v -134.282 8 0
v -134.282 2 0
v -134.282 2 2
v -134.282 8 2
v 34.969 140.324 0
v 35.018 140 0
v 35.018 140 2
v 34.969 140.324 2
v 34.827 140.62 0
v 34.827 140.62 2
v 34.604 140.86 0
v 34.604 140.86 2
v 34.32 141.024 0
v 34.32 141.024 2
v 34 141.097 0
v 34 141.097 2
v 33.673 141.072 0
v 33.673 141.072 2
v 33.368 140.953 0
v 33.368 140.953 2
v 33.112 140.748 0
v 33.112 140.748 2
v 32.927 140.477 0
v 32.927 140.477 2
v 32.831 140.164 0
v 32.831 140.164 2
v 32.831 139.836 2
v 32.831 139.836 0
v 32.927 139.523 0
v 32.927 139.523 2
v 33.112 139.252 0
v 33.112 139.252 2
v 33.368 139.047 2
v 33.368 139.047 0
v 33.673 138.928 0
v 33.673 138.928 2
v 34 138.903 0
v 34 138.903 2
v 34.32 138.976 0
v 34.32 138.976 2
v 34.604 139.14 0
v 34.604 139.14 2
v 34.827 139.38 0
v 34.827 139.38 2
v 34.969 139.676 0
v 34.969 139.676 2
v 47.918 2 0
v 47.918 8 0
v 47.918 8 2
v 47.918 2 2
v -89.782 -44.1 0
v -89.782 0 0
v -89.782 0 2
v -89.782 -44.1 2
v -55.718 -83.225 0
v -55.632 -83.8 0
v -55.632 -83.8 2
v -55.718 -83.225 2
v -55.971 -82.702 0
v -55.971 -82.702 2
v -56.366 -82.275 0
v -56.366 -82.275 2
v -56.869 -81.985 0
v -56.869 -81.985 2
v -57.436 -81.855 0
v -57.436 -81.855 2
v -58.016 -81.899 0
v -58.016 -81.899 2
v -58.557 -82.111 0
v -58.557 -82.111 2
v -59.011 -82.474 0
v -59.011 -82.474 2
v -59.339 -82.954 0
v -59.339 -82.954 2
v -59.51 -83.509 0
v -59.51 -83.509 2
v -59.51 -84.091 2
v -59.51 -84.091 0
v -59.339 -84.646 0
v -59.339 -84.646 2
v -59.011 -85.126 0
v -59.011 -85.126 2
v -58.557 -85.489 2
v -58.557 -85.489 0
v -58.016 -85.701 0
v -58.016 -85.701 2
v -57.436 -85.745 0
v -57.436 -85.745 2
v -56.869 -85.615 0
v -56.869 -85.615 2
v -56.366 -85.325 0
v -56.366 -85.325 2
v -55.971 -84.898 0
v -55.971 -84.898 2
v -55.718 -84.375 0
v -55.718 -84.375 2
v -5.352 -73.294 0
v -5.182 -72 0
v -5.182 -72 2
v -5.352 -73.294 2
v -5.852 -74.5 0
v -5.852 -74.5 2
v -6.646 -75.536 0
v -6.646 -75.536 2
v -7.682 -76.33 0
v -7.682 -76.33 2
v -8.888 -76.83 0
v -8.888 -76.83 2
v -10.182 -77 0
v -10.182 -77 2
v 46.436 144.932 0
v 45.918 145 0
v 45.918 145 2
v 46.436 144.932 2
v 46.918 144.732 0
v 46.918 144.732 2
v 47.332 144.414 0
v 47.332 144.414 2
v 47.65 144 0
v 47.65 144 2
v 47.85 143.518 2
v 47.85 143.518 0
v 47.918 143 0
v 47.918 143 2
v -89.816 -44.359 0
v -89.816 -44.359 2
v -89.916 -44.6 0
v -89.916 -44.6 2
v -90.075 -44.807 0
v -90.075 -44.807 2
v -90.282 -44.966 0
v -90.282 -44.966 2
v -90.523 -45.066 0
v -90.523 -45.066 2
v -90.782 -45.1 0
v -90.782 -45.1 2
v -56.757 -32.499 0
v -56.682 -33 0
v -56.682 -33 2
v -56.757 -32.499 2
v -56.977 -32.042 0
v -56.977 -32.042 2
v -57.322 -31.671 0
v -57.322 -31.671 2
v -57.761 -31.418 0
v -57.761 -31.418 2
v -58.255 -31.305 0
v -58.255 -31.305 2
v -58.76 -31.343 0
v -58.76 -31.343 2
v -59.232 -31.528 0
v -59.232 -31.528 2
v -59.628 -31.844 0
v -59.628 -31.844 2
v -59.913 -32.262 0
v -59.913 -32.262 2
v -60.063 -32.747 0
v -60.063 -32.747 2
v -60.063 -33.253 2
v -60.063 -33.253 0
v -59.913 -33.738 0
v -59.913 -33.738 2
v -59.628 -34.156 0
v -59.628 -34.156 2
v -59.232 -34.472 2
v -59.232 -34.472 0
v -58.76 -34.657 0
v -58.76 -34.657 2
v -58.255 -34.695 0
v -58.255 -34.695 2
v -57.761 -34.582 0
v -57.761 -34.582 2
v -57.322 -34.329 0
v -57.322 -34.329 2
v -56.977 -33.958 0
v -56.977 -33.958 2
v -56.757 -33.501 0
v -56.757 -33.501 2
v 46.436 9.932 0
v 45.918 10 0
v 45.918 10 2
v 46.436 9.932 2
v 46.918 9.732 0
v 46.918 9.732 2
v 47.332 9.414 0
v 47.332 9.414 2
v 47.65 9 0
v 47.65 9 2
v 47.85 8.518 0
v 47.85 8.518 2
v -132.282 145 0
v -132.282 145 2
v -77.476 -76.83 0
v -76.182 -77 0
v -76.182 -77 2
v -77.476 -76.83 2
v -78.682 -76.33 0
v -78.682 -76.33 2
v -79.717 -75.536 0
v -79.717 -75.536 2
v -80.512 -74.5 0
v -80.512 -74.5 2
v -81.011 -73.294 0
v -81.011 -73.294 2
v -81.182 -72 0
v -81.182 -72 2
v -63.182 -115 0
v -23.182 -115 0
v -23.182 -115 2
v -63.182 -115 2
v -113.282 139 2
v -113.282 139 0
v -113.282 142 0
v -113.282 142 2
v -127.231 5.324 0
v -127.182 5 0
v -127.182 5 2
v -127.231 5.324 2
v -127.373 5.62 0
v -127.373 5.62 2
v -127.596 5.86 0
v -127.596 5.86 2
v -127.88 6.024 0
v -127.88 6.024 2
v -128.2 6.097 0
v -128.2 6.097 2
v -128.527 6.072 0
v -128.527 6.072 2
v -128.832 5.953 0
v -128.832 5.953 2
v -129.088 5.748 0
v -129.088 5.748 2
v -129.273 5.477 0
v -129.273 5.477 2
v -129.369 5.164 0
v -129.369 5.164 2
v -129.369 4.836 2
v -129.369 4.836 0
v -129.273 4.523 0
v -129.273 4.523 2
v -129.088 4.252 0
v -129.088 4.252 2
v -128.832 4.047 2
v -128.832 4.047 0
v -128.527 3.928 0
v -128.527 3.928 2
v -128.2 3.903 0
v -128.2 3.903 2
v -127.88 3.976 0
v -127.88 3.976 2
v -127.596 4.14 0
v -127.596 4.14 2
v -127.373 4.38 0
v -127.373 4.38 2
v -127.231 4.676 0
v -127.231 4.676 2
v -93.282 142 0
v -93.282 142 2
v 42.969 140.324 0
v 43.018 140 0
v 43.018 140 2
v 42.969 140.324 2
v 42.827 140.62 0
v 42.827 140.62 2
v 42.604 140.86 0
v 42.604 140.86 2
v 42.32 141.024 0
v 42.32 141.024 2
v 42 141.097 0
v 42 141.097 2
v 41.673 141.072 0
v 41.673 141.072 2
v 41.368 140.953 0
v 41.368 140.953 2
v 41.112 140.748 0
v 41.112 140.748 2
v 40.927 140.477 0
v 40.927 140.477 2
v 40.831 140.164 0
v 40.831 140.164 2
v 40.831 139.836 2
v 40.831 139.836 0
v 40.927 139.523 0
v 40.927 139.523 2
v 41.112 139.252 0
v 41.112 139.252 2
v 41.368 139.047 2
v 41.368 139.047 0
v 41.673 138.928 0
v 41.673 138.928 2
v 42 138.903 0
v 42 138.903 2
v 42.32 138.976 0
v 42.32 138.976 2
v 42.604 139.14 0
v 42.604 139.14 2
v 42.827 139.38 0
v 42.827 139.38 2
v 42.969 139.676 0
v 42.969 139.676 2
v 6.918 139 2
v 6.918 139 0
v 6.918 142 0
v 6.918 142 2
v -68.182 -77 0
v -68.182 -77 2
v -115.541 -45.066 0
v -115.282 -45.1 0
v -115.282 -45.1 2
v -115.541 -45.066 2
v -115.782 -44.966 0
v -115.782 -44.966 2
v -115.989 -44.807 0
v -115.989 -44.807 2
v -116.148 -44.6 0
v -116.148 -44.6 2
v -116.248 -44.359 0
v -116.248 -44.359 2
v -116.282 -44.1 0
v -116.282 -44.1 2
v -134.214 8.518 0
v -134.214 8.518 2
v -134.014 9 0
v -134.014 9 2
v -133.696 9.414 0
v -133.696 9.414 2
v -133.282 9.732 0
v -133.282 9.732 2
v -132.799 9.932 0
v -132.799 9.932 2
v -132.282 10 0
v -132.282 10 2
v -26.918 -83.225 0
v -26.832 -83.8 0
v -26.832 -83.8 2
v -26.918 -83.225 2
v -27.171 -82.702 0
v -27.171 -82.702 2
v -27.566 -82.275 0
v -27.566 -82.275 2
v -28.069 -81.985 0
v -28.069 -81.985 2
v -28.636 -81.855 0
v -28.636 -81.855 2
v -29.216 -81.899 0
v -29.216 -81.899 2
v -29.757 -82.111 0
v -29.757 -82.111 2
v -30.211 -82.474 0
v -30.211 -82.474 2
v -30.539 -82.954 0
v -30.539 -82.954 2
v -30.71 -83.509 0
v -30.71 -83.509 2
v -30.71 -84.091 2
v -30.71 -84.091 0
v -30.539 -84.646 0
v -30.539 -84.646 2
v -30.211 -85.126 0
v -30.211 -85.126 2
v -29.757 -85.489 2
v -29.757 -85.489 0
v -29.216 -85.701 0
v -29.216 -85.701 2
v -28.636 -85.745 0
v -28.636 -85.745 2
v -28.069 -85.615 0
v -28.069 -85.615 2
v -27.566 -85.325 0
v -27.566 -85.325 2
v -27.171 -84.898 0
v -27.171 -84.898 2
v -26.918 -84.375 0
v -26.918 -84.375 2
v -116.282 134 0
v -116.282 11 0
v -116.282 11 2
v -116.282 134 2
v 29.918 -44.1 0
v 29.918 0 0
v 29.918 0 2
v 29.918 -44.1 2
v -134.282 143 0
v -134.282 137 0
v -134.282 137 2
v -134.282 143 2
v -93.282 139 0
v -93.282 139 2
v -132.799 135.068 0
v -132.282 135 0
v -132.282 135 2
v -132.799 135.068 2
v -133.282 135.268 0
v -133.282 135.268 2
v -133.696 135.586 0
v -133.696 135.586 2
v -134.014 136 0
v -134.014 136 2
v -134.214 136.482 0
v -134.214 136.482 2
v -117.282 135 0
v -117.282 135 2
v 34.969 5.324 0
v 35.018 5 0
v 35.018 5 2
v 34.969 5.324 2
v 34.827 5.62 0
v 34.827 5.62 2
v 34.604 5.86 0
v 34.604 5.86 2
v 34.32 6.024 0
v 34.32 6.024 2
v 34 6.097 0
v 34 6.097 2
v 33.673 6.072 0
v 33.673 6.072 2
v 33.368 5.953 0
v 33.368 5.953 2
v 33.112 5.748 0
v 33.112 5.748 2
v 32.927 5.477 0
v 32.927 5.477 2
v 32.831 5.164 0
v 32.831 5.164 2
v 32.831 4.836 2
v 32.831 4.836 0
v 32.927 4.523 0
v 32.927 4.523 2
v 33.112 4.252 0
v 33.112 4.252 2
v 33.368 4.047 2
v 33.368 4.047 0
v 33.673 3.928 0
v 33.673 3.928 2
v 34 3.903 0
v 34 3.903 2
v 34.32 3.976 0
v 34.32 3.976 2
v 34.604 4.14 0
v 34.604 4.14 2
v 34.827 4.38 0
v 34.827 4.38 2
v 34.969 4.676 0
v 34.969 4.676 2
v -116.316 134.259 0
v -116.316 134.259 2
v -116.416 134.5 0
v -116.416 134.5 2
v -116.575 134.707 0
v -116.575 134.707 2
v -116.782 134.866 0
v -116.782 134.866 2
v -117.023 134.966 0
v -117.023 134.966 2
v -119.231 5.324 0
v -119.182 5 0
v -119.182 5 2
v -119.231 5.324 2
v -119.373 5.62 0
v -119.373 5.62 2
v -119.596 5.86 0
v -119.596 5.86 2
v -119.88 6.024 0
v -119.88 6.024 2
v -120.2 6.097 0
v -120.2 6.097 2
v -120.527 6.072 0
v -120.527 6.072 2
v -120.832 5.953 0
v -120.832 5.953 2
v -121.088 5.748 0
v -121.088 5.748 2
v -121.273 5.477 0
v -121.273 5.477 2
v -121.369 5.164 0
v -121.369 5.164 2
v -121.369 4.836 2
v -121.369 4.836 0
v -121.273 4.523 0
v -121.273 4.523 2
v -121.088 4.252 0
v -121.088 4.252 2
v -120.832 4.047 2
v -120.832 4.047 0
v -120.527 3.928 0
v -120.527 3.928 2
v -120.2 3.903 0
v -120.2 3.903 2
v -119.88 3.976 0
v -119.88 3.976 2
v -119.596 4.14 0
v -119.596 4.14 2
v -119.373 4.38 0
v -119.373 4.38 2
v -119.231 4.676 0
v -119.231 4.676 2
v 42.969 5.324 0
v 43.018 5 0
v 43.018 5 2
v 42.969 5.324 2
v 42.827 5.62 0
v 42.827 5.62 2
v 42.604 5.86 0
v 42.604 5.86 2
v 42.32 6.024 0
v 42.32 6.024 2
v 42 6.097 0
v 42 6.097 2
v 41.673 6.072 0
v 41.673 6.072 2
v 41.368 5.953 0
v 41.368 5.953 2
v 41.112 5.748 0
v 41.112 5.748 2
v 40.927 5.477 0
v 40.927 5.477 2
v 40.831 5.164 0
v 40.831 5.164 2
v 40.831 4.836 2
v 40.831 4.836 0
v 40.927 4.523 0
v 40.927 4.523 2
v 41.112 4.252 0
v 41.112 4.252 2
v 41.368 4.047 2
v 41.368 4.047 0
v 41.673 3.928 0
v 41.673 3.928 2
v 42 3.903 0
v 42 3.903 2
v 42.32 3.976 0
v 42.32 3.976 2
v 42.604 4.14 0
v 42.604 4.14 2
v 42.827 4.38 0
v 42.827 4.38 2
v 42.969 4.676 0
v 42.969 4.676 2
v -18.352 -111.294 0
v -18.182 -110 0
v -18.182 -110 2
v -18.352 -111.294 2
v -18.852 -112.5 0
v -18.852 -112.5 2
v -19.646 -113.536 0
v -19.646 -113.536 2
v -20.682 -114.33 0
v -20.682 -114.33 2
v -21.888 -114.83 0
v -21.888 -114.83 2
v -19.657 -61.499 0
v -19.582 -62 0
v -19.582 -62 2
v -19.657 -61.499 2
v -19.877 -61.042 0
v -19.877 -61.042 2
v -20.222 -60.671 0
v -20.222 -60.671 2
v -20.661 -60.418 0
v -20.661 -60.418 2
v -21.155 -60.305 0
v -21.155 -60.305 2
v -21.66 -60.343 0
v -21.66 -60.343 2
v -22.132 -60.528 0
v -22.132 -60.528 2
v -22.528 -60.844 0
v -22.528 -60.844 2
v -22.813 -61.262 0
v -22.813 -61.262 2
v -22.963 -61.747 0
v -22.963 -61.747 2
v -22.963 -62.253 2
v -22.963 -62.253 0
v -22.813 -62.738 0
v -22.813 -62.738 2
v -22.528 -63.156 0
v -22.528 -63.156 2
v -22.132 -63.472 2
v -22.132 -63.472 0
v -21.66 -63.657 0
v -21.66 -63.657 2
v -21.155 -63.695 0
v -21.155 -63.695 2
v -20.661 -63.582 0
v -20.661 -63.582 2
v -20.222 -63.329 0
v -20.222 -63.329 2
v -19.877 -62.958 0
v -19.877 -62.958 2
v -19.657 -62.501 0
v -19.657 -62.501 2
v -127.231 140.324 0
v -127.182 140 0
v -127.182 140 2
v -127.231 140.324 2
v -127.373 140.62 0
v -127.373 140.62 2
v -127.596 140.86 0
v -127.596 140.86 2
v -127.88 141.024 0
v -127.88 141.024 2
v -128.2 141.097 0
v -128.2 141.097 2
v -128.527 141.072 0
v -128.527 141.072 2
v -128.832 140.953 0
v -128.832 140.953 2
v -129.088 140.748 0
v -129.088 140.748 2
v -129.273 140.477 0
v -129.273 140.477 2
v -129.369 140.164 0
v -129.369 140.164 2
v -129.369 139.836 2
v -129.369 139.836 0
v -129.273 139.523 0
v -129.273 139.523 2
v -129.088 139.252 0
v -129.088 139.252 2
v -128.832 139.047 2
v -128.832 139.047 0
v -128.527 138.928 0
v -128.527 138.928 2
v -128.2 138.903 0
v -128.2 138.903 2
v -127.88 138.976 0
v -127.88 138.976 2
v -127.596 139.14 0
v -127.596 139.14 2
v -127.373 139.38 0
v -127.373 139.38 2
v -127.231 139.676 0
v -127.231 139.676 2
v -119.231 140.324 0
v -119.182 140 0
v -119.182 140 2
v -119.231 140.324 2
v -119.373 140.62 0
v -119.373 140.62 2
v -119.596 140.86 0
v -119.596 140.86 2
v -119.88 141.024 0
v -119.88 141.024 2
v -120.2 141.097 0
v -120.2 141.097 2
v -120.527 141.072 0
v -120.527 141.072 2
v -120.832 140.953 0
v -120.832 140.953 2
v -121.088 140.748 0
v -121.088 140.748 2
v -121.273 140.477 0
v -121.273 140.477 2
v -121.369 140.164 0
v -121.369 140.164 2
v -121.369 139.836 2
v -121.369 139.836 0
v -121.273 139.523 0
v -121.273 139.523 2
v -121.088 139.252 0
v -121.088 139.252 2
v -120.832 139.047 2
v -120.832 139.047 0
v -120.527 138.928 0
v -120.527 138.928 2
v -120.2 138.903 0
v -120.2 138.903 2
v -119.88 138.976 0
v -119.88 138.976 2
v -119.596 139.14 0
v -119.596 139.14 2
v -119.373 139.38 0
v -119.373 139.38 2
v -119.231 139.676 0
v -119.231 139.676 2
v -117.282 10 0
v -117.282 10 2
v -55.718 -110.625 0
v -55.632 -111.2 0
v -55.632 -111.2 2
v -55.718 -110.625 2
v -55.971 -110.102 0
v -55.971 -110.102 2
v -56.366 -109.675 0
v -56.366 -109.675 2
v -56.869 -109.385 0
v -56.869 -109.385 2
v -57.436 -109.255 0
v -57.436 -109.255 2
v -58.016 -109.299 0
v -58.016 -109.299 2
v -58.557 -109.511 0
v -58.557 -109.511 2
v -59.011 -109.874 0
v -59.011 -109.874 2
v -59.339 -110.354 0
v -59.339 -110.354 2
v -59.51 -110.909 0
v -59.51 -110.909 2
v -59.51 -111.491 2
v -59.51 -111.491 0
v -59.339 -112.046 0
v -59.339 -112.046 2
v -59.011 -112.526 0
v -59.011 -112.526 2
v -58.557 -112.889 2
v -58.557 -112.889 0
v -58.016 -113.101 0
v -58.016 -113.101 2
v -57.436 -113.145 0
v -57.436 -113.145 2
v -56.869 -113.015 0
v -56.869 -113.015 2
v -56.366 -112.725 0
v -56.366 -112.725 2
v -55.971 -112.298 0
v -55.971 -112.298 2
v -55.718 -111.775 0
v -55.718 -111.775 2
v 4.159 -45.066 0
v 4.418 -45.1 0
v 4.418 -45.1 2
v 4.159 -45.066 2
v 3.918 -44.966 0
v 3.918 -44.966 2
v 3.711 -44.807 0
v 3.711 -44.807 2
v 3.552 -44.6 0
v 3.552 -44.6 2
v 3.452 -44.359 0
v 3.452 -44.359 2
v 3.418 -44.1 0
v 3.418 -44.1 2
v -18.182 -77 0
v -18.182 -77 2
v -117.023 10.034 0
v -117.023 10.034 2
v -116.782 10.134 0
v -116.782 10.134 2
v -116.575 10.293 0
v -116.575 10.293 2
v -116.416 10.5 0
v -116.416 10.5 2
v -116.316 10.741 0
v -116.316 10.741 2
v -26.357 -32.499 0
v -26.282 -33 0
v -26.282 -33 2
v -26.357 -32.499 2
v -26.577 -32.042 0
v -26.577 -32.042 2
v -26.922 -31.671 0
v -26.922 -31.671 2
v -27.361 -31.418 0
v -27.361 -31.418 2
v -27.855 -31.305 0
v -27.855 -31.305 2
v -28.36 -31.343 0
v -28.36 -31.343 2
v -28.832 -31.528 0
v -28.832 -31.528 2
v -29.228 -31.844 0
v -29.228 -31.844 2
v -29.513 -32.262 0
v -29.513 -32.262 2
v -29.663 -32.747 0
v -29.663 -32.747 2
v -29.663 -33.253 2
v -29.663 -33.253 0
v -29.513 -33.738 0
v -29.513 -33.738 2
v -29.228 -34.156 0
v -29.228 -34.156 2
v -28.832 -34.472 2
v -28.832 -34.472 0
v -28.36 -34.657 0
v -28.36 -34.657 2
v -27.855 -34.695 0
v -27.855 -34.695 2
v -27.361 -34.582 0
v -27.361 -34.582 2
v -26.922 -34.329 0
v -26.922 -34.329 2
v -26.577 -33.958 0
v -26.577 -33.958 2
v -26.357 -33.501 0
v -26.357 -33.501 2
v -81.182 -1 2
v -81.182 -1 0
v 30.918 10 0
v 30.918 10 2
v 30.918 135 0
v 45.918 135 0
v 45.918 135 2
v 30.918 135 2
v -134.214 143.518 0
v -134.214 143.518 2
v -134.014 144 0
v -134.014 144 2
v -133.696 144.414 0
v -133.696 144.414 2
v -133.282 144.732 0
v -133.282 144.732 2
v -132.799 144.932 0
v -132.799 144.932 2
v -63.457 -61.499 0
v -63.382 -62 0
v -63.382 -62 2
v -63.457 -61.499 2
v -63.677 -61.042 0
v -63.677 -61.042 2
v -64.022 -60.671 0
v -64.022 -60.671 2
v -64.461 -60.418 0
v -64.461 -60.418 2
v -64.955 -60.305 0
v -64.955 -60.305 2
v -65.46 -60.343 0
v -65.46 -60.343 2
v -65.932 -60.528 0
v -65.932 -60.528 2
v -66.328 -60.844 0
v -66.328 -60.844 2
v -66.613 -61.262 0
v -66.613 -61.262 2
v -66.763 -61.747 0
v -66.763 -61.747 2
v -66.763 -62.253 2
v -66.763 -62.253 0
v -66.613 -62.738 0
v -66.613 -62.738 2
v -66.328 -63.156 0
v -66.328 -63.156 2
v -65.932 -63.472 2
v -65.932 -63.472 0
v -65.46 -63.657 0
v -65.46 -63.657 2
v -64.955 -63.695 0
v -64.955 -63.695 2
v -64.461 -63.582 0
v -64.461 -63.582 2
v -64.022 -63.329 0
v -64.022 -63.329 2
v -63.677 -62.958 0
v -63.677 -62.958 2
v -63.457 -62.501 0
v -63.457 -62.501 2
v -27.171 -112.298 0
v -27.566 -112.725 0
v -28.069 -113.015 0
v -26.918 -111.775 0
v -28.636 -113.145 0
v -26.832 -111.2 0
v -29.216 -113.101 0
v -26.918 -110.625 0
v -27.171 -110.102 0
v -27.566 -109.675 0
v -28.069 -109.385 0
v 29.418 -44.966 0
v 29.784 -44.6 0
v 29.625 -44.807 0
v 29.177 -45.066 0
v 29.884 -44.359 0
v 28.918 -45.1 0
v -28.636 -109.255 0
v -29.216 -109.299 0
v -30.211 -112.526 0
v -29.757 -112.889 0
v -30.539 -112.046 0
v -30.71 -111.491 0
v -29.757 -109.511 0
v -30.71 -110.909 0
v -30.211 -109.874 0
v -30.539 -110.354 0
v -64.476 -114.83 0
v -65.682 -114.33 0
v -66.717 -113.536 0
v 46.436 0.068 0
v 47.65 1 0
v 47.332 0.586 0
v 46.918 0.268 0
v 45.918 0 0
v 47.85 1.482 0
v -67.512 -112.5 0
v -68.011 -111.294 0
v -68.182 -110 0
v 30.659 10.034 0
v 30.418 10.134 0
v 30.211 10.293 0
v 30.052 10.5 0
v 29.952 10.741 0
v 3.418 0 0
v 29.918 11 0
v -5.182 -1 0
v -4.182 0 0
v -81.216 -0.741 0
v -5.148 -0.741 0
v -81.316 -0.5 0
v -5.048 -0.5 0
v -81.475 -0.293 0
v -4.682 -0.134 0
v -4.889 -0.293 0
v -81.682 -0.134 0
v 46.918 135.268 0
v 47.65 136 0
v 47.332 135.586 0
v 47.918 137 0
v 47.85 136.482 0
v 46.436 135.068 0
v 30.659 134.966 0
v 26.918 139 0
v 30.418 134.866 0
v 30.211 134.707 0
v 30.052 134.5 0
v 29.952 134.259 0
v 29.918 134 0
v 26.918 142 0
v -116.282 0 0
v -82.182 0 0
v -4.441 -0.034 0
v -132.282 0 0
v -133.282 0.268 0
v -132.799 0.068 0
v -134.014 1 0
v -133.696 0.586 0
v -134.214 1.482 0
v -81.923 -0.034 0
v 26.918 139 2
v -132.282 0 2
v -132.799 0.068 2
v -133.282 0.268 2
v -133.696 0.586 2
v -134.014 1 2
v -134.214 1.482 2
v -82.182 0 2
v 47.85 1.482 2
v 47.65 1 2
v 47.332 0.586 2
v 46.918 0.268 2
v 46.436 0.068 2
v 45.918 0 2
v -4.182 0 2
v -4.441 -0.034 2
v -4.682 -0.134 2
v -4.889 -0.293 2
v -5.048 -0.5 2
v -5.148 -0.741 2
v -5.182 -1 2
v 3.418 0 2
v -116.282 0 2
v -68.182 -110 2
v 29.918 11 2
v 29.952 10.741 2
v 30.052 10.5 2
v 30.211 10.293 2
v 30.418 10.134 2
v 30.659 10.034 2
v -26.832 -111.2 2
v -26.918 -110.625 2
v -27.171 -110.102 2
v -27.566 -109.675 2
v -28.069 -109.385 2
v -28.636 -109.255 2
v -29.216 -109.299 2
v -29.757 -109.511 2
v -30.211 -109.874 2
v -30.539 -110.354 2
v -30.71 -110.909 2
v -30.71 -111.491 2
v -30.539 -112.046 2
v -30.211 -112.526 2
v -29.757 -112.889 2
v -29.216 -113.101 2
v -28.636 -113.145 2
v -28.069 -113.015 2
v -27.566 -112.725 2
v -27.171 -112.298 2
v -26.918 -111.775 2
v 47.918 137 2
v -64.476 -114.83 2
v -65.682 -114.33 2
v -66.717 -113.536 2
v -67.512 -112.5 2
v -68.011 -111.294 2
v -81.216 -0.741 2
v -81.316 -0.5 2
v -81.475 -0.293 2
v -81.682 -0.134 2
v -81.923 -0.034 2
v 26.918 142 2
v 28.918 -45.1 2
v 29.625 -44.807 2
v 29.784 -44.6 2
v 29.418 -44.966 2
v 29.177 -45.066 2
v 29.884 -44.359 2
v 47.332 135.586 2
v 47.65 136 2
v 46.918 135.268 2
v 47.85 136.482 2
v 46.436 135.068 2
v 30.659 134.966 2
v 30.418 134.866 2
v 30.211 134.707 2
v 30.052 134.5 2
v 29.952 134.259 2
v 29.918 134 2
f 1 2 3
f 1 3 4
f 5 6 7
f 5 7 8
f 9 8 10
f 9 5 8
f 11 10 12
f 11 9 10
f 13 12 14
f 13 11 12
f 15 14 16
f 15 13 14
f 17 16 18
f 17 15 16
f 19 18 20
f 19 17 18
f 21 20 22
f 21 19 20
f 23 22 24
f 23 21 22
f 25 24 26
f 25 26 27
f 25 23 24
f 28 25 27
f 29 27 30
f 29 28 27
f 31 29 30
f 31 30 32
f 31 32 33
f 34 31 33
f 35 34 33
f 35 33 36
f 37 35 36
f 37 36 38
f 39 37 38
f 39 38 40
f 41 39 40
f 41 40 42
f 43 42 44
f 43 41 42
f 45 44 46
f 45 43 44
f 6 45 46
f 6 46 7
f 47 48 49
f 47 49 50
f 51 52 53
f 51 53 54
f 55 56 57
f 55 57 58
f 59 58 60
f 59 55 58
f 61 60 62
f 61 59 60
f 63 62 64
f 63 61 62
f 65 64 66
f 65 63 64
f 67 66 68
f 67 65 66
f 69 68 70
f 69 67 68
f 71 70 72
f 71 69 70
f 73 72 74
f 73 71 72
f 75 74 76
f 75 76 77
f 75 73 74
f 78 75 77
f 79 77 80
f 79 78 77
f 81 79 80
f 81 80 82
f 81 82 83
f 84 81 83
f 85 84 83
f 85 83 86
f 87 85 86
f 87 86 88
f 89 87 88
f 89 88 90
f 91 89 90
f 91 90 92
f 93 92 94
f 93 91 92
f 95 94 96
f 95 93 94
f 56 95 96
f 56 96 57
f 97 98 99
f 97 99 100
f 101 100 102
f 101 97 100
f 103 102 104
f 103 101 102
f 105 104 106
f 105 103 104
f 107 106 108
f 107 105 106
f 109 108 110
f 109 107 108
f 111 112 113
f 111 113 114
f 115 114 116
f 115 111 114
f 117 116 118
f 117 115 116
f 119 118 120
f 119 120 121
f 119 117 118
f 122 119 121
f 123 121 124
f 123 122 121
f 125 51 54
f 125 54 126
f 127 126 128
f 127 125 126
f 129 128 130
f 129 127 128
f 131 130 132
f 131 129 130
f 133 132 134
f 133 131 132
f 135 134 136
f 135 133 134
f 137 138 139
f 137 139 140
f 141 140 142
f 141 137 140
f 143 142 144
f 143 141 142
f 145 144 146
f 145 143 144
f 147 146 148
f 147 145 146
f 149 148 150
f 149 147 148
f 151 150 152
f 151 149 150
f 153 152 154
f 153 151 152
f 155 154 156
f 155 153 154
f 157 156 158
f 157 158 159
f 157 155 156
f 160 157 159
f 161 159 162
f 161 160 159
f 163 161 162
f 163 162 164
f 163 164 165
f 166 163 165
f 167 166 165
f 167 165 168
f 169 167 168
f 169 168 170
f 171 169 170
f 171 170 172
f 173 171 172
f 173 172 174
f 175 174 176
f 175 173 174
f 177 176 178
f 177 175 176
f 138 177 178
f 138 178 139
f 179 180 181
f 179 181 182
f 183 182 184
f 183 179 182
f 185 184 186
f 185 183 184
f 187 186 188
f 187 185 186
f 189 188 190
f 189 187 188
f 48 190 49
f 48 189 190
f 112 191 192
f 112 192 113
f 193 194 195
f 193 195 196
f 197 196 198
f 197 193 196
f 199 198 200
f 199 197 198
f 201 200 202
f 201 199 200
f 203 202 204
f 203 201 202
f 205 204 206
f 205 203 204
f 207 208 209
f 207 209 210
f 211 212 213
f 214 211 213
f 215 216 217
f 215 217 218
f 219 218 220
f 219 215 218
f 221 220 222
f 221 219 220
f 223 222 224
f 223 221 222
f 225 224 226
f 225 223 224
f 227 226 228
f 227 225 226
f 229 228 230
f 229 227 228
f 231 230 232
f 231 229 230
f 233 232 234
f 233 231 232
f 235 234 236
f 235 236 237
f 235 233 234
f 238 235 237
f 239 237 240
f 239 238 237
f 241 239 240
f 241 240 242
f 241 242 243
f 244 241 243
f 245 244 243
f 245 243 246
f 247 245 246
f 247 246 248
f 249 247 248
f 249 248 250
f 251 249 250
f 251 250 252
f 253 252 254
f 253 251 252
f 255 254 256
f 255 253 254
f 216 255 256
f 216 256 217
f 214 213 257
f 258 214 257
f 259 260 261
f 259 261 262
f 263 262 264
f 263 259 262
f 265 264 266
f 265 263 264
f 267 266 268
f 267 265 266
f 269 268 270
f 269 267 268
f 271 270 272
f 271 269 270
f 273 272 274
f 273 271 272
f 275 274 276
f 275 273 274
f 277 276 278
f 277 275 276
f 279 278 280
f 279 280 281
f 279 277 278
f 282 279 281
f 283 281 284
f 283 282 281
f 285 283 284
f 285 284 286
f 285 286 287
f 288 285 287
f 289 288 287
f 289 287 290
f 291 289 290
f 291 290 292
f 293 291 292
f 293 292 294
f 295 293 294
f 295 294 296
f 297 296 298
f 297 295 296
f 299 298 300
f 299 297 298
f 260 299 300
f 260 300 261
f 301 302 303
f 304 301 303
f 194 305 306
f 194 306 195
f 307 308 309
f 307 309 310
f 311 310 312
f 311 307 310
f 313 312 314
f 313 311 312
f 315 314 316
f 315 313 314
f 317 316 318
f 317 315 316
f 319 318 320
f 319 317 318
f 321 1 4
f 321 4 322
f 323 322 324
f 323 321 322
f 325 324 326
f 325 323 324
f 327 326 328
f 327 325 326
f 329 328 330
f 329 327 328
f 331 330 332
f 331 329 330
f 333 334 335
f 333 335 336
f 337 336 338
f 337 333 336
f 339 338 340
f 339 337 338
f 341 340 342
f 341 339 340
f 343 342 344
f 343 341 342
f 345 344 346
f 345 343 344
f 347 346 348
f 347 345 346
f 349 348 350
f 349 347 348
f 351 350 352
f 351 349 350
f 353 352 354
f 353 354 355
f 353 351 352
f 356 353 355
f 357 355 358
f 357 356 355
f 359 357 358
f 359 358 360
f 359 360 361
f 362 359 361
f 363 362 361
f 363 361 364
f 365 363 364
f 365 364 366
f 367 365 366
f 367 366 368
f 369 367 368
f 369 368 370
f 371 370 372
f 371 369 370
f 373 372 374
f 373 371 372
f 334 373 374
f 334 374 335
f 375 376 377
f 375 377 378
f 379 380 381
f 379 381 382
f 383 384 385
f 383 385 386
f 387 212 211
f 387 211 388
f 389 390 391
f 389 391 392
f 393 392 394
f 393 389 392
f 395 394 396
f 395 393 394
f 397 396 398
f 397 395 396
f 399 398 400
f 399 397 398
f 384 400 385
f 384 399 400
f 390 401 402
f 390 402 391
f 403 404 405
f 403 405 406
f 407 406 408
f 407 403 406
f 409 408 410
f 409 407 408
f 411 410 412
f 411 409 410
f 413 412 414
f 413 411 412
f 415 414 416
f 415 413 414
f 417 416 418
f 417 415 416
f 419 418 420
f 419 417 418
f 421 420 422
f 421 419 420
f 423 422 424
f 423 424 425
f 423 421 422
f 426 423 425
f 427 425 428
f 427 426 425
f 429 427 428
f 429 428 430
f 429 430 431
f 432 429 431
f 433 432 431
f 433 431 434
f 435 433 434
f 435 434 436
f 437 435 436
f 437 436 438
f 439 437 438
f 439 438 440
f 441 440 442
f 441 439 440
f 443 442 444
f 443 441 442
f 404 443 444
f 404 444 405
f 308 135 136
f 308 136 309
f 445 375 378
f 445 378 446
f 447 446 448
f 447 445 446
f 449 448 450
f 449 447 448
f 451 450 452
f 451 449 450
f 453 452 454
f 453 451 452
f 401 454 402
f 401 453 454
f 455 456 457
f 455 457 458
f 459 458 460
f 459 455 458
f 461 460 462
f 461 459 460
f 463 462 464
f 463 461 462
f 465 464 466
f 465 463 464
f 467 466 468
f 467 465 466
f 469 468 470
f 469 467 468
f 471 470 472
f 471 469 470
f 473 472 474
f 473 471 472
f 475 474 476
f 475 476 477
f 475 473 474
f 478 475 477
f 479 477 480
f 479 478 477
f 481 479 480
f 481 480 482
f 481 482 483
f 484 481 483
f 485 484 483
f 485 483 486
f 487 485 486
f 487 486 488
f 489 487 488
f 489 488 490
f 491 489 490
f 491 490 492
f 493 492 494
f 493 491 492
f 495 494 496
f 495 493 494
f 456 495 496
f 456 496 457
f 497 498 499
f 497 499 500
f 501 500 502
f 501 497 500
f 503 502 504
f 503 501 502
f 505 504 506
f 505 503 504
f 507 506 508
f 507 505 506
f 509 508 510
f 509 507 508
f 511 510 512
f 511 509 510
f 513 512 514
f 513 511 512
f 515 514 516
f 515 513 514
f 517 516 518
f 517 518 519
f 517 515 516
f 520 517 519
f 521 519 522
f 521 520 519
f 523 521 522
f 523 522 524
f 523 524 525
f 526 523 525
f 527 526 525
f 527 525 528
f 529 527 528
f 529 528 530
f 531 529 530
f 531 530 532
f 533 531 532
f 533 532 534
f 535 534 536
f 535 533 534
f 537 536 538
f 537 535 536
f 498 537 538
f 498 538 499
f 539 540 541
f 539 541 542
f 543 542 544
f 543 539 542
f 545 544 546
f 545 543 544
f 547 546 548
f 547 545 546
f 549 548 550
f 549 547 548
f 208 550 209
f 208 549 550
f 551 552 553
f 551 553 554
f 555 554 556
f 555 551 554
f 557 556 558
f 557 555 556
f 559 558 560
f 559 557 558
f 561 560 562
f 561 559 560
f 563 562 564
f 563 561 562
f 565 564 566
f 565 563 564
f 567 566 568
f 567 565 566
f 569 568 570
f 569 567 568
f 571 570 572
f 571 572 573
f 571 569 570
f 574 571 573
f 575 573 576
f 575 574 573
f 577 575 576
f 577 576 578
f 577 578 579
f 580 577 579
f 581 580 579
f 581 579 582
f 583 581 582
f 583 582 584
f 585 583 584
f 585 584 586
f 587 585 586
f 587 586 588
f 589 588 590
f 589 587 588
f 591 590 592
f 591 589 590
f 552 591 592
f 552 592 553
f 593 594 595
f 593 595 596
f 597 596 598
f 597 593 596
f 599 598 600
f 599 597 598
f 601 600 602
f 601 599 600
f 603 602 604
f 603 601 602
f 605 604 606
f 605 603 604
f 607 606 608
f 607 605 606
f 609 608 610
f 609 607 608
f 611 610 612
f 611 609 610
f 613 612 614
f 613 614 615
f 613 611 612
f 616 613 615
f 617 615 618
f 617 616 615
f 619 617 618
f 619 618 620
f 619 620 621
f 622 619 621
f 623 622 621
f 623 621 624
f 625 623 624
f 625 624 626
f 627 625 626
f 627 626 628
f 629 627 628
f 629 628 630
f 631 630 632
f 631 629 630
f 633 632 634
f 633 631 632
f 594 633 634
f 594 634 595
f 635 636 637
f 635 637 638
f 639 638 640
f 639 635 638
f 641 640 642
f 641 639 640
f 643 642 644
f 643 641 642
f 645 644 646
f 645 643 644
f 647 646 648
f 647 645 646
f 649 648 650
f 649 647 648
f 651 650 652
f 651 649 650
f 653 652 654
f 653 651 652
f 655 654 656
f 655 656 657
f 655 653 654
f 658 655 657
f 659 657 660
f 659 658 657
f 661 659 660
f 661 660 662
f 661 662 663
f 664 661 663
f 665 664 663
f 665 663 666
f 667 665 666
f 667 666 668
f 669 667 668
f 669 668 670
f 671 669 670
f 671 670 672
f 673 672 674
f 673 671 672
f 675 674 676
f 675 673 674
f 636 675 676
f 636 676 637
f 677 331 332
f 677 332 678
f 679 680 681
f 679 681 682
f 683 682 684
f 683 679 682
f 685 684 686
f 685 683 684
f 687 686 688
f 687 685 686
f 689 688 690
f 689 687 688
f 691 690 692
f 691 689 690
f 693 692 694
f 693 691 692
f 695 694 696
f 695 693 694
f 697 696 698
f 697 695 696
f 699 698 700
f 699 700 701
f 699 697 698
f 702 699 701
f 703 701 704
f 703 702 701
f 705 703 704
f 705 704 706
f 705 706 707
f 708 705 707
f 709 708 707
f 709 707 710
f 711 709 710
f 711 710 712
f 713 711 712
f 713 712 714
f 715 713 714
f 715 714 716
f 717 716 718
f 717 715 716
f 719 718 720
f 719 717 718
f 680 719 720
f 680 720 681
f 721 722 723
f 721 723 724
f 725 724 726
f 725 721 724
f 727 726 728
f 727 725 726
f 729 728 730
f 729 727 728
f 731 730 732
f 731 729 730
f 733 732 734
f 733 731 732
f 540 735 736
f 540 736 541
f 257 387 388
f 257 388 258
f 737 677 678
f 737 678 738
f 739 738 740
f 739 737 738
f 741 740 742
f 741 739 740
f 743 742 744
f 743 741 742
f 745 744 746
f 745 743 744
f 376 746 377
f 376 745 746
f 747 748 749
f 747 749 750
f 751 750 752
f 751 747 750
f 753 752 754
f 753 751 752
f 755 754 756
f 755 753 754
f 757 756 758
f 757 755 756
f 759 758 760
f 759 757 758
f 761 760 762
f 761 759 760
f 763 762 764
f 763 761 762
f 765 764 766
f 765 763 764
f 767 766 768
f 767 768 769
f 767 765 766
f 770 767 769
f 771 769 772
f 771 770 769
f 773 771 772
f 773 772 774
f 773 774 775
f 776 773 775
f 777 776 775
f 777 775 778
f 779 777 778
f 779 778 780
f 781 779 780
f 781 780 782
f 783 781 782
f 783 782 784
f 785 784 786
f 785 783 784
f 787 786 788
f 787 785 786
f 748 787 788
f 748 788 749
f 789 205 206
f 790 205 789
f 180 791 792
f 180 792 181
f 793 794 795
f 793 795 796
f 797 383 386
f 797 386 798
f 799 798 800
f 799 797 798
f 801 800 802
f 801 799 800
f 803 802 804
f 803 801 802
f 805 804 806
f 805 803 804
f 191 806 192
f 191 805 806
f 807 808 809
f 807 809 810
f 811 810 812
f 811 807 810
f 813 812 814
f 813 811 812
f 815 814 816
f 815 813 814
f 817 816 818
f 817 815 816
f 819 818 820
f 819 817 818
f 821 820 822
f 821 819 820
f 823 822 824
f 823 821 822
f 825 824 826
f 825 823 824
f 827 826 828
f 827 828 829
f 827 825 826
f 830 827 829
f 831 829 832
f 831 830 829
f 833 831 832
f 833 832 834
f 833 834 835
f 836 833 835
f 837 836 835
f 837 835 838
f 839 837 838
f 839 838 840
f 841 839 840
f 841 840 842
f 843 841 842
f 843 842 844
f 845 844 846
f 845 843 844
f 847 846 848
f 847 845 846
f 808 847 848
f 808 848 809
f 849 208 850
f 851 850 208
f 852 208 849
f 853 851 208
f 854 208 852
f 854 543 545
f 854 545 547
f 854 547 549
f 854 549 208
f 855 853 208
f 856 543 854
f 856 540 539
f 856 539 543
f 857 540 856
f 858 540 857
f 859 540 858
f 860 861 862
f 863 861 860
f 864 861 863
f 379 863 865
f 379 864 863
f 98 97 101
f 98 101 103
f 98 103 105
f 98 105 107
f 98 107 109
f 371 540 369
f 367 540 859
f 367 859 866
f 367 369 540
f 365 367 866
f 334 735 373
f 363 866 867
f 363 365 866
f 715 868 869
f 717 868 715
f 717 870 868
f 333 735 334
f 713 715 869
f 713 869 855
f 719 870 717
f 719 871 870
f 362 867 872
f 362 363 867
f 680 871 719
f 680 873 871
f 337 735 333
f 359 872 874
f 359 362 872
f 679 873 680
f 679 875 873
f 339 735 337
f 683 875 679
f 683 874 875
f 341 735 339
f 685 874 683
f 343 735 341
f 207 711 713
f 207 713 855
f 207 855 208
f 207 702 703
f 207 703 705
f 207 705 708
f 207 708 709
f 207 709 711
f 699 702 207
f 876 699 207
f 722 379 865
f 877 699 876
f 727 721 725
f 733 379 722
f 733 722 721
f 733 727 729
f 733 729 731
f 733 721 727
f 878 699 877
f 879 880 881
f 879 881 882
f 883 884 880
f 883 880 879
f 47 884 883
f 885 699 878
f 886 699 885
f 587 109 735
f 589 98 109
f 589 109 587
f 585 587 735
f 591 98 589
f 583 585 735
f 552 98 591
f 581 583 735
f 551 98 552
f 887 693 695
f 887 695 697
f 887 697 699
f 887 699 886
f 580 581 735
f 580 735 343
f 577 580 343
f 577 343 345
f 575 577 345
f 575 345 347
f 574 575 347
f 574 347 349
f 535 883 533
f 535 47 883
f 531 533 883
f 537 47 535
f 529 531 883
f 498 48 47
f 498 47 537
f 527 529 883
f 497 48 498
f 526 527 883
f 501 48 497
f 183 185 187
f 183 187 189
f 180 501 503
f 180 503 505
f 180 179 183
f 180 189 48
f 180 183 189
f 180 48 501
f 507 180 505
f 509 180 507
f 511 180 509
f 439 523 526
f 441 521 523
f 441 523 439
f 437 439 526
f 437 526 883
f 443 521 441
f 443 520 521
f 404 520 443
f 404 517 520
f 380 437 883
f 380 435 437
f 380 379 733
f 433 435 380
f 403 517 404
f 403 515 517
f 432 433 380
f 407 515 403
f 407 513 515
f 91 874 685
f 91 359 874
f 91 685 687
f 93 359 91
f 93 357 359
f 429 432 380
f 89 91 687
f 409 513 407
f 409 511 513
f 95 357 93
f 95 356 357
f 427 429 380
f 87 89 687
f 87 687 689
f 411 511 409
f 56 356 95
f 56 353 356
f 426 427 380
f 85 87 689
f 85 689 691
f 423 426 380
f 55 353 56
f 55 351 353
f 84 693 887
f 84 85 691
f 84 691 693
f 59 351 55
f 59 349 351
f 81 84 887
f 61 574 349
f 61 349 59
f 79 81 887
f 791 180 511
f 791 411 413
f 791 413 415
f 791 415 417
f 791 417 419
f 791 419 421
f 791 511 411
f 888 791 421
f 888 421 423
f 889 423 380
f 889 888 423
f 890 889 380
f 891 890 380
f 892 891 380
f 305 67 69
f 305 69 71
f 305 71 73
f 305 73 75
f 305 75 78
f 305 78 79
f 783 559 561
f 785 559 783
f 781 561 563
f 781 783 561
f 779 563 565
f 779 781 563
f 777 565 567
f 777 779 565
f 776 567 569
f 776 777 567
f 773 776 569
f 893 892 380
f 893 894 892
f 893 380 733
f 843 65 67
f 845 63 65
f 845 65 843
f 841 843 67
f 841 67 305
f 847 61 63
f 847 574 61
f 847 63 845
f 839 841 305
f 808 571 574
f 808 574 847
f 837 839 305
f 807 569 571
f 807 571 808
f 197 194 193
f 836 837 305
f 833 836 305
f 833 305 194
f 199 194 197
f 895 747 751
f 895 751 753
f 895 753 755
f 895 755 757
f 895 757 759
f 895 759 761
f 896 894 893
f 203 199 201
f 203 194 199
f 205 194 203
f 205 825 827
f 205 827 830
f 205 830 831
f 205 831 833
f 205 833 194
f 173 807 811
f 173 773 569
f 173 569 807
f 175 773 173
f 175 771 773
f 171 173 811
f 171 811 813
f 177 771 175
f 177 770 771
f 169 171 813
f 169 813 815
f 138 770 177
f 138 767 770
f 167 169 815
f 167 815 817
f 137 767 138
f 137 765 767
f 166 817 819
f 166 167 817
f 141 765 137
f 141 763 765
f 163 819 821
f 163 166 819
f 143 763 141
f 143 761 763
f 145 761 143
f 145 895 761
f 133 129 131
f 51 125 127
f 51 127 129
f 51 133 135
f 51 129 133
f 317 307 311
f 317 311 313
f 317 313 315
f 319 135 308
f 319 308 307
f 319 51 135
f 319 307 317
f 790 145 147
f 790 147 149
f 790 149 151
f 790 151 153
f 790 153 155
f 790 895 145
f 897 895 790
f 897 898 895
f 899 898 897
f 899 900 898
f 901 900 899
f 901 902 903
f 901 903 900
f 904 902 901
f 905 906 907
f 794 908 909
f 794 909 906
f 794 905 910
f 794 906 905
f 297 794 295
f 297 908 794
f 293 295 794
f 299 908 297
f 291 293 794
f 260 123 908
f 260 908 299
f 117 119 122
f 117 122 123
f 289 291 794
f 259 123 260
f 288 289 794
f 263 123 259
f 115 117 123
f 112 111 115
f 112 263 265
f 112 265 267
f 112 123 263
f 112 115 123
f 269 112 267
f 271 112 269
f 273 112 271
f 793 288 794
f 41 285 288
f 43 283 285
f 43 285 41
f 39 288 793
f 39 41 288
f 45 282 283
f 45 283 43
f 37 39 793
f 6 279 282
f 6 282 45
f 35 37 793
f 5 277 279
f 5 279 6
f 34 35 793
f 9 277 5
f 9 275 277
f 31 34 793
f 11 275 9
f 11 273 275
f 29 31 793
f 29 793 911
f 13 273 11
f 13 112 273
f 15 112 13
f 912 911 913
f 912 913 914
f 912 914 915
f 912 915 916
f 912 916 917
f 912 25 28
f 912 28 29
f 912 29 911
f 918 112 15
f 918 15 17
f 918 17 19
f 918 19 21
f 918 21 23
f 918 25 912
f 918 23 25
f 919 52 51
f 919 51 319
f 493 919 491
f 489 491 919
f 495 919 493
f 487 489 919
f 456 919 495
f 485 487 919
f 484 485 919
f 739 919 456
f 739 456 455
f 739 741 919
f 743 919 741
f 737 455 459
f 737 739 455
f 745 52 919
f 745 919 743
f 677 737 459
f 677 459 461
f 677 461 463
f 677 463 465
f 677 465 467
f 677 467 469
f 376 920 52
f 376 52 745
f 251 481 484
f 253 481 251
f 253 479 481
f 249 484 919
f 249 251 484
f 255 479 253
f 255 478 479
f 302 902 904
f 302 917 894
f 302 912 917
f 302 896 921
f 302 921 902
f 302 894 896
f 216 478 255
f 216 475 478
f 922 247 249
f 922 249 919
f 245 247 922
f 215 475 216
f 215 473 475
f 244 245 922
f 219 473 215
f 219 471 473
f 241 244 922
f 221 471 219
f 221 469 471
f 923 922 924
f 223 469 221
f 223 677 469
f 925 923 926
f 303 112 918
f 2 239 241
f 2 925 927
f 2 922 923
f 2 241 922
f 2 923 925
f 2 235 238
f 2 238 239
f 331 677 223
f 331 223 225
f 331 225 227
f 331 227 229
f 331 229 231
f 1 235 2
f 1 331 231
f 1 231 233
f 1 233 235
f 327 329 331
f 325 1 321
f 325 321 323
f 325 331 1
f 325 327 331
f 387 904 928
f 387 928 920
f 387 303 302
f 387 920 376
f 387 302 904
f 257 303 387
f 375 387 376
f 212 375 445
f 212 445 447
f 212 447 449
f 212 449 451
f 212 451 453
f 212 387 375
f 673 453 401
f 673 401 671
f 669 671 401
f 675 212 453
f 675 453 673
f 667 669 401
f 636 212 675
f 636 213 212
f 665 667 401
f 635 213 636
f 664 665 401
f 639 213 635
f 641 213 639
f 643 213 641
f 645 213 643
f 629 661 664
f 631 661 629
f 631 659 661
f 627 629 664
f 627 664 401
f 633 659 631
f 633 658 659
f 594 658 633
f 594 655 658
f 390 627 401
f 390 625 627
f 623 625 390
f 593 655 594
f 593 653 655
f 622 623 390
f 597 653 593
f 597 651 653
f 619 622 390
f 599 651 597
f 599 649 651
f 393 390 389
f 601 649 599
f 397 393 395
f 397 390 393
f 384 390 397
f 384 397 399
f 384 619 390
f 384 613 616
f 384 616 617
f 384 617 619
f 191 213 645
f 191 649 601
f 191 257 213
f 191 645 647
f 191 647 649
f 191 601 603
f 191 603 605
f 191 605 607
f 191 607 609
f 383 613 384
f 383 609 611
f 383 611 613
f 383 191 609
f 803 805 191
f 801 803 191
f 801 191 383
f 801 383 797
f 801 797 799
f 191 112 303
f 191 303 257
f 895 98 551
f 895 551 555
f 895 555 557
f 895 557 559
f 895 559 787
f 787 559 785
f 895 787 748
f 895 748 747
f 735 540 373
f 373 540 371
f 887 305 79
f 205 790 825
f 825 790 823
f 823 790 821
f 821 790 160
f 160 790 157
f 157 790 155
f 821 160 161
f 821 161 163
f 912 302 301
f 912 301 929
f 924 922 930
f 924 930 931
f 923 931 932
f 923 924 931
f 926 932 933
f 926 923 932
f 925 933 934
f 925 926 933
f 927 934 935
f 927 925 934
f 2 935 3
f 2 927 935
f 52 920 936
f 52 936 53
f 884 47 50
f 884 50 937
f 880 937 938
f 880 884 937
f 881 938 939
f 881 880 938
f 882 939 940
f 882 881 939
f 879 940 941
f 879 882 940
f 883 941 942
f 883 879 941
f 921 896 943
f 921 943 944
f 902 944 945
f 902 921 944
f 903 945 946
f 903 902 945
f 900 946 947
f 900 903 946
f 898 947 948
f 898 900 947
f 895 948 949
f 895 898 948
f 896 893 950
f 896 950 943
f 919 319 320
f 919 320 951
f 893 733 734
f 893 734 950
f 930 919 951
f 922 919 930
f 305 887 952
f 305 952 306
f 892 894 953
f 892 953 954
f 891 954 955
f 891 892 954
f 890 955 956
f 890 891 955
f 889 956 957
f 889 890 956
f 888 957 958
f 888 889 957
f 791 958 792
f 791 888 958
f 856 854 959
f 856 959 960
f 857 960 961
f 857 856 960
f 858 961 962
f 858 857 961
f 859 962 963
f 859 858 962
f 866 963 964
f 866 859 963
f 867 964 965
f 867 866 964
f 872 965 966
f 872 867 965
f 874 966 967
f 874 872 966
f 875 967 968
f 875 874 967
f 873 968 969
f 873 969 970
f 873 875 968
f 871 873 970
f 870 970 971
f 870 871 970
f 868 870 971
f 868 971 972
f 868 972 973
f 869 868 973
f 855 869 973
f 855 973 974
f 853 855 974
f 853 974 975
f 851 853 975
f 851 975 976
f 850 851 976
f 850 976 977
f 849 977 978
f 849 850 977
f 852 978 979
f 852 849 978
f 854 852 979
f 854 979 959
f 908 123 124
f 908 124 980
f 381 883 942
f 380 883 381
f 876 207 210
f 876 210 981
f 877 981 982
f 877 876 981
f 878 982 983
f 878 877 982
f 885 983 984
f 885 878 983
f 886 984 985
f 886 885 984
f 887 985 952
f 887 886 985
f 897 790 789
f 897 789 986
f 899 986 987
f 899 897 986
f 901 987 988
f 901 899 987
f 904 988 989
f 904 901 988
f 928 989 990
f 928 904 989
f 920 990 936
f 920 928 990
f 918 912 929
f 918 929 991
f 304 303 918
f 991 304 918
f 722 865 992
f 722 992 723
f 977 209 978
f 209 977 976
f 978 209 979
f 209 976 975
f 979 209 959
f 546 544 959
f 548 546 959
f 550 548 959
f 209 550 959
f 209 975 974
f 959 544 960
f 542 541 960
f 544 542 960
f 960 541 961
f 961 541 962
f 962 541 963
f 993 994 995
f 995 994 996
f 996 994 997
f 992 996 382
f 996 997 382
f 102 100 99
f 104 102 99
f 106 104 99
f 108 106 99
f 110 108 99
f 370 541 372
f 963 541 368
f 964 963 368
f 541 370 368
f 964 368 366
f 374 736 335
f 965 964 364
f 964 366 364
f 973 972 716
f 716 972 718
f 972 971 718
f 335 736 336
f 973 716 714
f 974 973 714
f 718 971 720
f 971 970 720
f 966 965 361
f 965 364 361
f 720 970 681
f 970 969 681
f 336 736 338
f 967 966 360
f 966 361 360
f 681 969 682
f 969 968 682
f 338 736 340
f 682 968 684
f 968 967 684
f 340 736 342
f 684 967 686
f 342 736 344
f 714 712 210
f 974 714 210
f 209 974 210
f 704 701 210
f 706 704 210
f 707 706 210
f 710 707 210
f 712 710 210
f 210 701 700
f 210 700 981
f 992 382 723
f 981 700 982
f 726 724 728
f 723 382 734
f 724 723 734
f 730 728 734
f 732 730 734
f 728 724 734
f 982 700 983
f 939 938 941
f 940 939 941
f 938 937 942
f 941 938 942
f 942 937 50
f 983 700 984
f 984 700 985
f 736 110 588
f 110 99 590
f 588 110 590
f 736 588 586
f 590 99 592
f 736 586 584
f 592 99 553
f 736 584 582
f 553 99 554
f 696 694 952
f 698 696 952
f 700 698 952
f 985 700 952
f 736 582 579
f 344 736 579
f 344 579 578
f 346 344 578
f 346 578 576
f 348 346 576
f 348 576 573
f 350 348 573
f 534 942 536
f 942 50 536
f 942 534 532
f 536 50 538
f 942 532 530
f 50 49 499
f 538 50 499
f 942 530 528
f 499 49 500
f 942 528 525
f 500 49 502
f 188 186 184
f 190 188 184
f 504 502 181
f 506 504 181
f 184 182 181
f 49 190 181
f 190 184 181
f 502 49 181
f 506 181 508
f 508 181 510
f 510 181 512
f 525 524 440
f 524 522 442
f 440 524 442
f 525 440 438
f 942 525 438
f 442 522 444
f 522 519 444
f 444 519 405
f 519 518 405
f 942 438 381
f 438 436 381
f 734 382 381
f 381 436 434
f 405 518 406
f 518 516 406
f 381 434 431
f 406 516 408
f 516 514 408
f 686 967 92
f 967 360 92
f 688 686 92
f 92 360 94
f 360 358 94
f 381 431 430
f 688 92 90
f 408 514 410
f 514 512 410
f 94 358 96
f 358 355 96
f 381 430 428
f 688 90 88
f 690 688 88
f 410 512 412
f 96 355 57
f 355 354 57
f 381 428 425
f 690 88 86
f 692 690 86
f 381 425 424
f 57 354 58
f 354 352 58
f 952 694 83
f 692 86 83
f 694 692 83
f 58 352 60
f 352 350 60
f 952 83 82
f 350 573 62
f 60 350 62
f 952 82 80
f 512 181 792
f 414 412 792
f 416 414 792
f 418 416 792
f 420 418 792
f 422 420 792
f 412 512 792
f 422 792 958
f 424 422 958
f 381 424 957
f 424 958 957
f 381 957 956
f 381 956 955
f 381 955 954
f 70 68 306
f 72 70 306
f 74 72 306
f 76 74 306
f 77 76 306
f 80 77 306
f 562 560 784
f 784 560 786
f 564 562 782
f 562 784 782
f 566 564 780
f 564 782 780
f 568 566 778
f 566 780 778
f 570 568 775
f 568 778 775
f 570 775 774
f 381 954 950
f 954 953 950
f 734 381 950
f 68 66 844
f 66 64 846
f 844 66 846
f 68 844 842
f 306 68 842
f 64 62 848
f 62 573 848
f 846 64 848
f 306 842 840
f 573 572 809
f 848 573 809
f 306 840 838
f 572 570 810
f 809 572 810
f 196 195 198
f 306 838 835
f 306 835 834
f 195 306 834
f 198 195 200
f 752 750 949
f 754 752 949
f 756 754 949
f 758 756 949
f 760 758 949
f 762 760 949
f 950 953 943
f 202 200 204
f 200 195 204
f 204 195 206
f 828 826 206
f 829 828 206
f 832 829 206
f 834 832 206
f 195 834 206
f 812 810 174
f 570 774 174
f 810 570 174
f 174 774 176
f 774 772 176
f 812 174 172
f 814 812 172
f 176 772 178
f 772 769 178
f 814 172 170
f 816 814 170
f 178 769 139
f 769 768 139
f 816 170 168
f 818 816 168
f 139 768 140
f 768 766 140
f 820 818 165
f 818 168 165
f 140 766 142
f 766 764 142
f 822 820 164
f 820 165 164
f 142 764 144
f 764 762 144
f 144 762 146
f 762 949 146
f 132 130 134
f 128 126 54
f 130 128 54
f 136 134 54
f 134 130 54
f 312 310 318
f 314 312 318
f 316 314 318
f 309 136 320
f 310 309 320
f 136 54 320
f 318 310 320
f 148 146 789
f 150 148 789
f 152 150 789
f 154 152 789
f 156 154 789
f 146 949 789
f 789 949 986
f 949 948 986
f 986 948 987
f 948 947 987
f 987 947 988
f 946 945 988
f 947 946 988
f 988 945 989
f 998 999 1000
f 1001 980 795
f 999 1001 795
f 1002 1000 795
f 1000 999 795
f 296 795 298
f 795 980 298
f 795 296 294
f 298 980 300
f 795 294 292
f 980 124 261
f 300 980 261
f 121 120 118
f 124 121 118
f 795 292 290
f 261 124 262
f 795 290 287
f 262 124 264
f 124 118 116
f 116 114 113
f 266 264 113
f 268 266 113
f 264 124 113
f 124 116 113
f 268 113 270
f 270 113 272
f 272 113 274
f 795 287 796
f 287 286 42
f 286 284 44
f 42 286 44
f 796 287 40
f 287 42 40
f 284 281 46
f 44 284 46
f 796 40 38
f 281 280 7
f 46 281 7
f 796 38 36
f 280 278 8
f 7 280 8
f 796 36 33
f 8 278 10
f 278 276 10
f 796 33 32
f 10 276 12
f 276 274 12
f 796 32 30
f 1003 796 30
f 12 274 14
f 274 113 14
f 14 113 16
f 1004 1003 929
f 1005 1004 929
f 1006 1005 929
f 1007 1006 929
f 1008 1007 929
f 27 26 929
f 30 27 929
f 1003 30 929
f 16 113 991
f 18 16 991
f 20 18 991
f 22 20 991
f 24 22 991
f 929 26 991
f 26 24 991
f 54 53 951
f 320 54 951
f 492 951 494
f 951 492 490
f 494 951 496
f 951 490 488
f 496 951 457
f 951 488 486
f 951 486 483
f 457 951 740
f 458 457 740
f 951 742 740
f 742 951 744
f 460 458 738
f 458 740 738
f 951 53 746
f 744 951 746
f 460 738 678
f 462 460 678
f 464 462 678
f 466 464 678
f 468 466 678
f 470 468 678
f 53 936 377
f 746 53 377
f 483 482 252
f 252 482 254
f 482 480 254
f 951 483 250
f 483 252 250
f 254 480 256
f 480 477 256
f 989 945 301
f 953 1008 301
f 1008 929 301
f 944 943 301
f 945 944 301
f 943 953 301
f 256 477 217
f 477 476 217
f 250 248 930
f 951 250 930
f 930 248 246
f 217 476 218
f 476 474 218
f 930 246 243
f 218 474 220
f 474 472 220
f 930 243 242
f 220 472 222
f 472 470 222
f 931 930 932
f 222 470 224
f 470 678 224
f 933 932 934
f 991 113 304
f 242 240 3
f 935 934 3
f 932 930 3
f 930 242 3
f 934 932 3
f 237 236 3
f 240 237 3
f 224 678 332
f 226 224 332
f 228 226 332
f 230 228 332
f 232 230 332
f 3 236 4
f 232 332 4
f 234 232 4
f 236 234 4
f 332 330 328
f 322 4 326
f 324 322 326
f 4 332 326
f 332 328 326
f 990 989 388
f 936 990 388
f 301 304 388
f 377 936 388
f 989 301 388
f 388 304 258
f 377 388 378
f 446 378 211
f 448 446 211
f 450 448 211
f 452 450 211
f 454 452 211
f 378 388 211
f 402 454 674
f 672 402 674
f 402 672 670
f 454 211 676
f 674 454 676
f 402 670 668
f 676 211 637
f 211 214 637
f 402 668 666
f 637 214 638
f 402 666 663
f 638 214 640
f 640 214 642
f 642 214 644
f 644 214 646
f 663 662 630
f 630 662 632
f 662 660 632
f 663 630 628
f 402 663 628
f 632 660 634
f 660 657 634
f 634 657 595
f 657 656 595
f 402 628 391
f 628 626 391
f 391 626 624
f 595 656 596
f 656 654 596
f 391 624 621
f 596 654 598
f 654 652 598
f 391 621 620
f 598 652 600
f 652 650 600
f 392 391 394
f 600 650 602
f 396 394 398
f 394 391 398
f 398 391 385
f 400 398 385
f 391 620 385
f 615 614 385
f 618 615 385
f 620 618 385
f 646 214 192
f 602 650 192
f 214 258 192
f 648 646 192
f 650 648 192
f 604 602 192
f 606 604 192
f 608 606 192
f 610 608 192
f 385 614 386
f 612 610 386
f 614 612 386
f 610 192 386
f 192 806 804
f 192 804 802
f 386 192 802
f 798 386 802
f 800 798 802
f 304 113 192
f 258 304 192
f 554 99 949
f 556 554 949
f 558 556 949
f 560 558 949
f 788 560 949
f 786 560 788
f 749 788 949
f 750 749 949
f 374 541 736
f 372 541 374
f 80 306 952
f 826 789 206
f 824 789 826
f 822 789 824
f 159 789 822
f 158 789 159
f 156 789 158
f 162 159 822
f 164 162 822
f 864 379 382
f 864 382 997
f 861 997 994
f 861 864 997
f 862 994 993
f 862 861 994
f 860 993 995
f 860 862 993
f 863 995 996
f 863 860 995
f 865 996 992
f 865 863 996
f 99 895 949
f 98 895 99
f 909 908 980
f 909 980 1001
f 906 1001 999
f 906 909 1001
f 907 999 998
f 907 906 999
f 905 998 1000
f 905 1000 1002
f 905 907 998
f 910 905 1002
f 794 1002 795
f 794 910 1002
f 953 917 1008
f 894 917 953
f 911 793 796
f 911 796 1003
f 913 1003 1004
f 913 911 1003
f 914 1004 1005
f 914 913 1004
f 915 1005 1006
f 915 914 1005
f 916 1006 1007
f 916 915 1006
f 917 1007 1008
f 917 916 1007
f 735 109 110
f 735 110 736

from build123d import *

# Parameters (mm, degrees)
SKETCH1_R           = 1.95
SKETCH1_R_2         = 1.1
SKETCH1_R_3         = 1.7
SKETCH1_W           = 20
SKETCH1_H           = 3
BOSS_EXTRUDE2_DEPTH = 2


with BuildPart() as part:
    # Sketch1 → Boss-Extrude2 (new body)
    with BuildSketch(Plane.XY):
        with BuildLine():
            Line((-132.281780802, 145), (45.918219198, 145))
            ThreePointArc((45.918219198, 145), (47.332432761, 144.414213562), (47.918219198, 143))
            Line((47.918219198, 143), (47.918219198, 137))
            ThreePointArc((47.918219198, 137), (47.332432761, 135.585786438), (45.918219198, 135))
            Line((45.918219198, 135), (30.918219198, 135))
            ThreePointArc((30.918219198, 135), (30.211112417, 134.707106781), (29.918219198, 134))
            Line((29.918219198, 134), (29.918219198, 11))
            ThreePointArc((29.918219198, 11), (30.211112417, 10.292893219), (30.918219198, 10))
            Line((30.918219198, 10), (45.918219198, 10))
            ThreePointArc((45.918219198, 10), (47.332432761, 9.414213562), (47.918219198, 8))
            Line((47.918219198, 8), (47.918219198, 2))
            ThreePointArc((47.918219198, 2), (47.332432761, 0.585786438), (45.918219198, 0))
            Line((45.918219198, 0), (29.918219198, 0))
            Line((29.918219198, 0), (29.918219198, -44.1))
            ThreePointArc((29.918219198, -44.1), (29.62532598, -44.807106781), (28.918219198, -45.1))
            Line((28.918219198, -45.1), (4.418219198, -45.1))
            ThreePointArc((4.418219198, -45.1), (3.711112417, -44.807106781), (3.418219198, -44.1))
            Line((3.418219198, -44.1), (3.418219198, 0))
            Line((3.418219198, 0), (-4.181780802, 0))
            ThreePointArc((-4.181780802, 0), (-4.888887583, -0.292893219), (-5.181780802, -1))
            Line((-5.181780802, -1), (-5.181780802, -72))
            ThreePointArc((-5.181780802, -72), (-6.646246896, -75.535533906), (-10.181780802, -77))
            Line((-10.181780802, -77), (-18.181780802, -77))
            Line((-18.181780802, -77), (-18.181780802, -110))
            ThreePointArc((-18.181780802, -110), (-19.646246896, -113.535533906), (-23.181780802, -115))
            Line((-23.181780802, -115), (-63.181780802, -115))
            ThreePointArc((-63.181780802, -115), (-66.717314707, -113.535533906), (-68.181780802, -110))
            Line((-68.181780802, -110), (-68.181780802, -77))
            Line((-68.181780802, -77), (-76.181780802, -77))
            ThreePointArc((-76.181780802, -77), (-79.717314707, -75.535533906), (-81.181780802, -72))
            Line((-81.181780802, -72), (-81.181780802, -1))
            ThreePointArc((-81.181780802, -1), (-81.47467402, -0.292893219), (-82.181780802, 0))
            Line((-82.181780802, 0), (-89.781780802, 0))
            Line((-89.781780802, 0), (-89.781780802, -44.1))
            ThreePointArc((-89.781780802, -44.1), (-90.07467402, -44.807106781), (-90.781780802, -45.1))
            Line((-90.781780802, -45.1), (-115.281780802, -45.1))
            ThreePointArc((-115.281780802, -45.1), (-115.988887583, -44.807106781), (-116.281780802, -44.1))
            Line((-116.281780802, -44.1), (-116.281780802, 0))
            Line((-116.281780802, 0), (-132.281780802, 0))
            ThreePointArc((-132.281780802, 0), (-133.695994364, 0.585786438), (-134.281780802, 2))
            Line((-134.281780802, 2), (-134.281780802, 8))
            ThreePointArc((-134.281780802, 8), (-133.695994364, 9.414213562), (-132.281780802, 10))
            Line((-132.281780802, 10), (-117.281780802, 10))
            ThreePointArc((-117.281780802, 10), (-116.57467402, 10.292893219), (-116.281780802, 11))
            Line((-116.281780802, 11), (-116.281780802, 134))
            ThreePointArc((-116.281780802, 134), (-116.57467402, 134.707106781), (-117.281780802, 135))
            Line((-117.281780802, 135), (-132.281780802, 135))
            ThreePointArc((-132.281780802, 135), (-133.695994364, 135.585786438), (-134.281780802, 137))
            Line((-134.281780802, 137), (-134.281780802, 143))
            ThreePointArc((-134.281780802, 143), (-133.695994364, 144.414213562), (-132.281780802, 145))
        make_face()
        with Locations((-28.781780802, -111.2)):
            Circle(SKETCH1_R, mode=Mode.SUBTRACT)
        with Locations((41.918219198, 140)):
            Circle(SKETCH1_R_2, mode=Mode.SUBTRACT)
        with Locations((33.918219198, 140)):
            Circle(SKETCH1_R_2, mode=Mode.SUBTRACT)
        with Locations((41.918219198, 5)):
            Circle(SKETCH1_R_2, mode=Mode.SUBTRACT)
        with Locations((33.918219198, 5)):
            Circle(SKETCH1_R_2, mode=Mode.SUBTRACT)
        with Locations((-28.781780802, -83.8)):
            Circle(SKETCH1_R, mode=Mode.SUBTRACT)
        with Locations((-21.281780802, -62)):
            Circle(SKETCH1_R_3, mode=Mode.SUBTRACT)
        with Locations((-27.981780802, -33)):
            Circle(SKETCH1_R_3, mode=Mode.SUBTRACT)
        with Locations((-58.381780802, -33)):
            Circle(SKETCH1_R_3, mode=Mode.SUBTRACT)
        with Locations((-65.081780802, -62)):
            Circle(SKETCH1_R_3, mode=Mode.SUBTRACT)
        with Locations((-57.581780802, -83.8)):
            Circle(SKETCH1_R, mode=Mode.SUBTRACT)
        with Locations((-120.281780802, 5)):
            Circle(SKETCH1_R_2, mode=Mode.SUBTRACT)
        with Locations((-128.281780802, 5)):
            Circle(SKETCH1_R_2, mode=Mode.SUBTRACT)
        with Locations((-120.281780802, 140)):
            Circle(SKETCH1_R_2, mode=Mode.SUBTRACT)
        with Locations((-128.281780802, 140)):
            Circle(SKETCH1_R_2, mode=Mode.SUBTRACT)
        with Locations((-57.581780802, -111.2)):
            Circle(SKETCH1_R, mode=Mode.SUBTRACT)
        with Locations((-103.281780802, 140.5)):
            Rectangle(SKETCH1_W, SKETCH1_H, mode=Mode.SUBTRACT)
        with Locations((16.918219198, 140.5)):
            Rectangle(SKETCH1_W, SKETCH1_H, mode=Mode.SUBTRACT)
    extrude(amount=BOSS_EXTRUDE2_DEPTH)


solid = part.part
